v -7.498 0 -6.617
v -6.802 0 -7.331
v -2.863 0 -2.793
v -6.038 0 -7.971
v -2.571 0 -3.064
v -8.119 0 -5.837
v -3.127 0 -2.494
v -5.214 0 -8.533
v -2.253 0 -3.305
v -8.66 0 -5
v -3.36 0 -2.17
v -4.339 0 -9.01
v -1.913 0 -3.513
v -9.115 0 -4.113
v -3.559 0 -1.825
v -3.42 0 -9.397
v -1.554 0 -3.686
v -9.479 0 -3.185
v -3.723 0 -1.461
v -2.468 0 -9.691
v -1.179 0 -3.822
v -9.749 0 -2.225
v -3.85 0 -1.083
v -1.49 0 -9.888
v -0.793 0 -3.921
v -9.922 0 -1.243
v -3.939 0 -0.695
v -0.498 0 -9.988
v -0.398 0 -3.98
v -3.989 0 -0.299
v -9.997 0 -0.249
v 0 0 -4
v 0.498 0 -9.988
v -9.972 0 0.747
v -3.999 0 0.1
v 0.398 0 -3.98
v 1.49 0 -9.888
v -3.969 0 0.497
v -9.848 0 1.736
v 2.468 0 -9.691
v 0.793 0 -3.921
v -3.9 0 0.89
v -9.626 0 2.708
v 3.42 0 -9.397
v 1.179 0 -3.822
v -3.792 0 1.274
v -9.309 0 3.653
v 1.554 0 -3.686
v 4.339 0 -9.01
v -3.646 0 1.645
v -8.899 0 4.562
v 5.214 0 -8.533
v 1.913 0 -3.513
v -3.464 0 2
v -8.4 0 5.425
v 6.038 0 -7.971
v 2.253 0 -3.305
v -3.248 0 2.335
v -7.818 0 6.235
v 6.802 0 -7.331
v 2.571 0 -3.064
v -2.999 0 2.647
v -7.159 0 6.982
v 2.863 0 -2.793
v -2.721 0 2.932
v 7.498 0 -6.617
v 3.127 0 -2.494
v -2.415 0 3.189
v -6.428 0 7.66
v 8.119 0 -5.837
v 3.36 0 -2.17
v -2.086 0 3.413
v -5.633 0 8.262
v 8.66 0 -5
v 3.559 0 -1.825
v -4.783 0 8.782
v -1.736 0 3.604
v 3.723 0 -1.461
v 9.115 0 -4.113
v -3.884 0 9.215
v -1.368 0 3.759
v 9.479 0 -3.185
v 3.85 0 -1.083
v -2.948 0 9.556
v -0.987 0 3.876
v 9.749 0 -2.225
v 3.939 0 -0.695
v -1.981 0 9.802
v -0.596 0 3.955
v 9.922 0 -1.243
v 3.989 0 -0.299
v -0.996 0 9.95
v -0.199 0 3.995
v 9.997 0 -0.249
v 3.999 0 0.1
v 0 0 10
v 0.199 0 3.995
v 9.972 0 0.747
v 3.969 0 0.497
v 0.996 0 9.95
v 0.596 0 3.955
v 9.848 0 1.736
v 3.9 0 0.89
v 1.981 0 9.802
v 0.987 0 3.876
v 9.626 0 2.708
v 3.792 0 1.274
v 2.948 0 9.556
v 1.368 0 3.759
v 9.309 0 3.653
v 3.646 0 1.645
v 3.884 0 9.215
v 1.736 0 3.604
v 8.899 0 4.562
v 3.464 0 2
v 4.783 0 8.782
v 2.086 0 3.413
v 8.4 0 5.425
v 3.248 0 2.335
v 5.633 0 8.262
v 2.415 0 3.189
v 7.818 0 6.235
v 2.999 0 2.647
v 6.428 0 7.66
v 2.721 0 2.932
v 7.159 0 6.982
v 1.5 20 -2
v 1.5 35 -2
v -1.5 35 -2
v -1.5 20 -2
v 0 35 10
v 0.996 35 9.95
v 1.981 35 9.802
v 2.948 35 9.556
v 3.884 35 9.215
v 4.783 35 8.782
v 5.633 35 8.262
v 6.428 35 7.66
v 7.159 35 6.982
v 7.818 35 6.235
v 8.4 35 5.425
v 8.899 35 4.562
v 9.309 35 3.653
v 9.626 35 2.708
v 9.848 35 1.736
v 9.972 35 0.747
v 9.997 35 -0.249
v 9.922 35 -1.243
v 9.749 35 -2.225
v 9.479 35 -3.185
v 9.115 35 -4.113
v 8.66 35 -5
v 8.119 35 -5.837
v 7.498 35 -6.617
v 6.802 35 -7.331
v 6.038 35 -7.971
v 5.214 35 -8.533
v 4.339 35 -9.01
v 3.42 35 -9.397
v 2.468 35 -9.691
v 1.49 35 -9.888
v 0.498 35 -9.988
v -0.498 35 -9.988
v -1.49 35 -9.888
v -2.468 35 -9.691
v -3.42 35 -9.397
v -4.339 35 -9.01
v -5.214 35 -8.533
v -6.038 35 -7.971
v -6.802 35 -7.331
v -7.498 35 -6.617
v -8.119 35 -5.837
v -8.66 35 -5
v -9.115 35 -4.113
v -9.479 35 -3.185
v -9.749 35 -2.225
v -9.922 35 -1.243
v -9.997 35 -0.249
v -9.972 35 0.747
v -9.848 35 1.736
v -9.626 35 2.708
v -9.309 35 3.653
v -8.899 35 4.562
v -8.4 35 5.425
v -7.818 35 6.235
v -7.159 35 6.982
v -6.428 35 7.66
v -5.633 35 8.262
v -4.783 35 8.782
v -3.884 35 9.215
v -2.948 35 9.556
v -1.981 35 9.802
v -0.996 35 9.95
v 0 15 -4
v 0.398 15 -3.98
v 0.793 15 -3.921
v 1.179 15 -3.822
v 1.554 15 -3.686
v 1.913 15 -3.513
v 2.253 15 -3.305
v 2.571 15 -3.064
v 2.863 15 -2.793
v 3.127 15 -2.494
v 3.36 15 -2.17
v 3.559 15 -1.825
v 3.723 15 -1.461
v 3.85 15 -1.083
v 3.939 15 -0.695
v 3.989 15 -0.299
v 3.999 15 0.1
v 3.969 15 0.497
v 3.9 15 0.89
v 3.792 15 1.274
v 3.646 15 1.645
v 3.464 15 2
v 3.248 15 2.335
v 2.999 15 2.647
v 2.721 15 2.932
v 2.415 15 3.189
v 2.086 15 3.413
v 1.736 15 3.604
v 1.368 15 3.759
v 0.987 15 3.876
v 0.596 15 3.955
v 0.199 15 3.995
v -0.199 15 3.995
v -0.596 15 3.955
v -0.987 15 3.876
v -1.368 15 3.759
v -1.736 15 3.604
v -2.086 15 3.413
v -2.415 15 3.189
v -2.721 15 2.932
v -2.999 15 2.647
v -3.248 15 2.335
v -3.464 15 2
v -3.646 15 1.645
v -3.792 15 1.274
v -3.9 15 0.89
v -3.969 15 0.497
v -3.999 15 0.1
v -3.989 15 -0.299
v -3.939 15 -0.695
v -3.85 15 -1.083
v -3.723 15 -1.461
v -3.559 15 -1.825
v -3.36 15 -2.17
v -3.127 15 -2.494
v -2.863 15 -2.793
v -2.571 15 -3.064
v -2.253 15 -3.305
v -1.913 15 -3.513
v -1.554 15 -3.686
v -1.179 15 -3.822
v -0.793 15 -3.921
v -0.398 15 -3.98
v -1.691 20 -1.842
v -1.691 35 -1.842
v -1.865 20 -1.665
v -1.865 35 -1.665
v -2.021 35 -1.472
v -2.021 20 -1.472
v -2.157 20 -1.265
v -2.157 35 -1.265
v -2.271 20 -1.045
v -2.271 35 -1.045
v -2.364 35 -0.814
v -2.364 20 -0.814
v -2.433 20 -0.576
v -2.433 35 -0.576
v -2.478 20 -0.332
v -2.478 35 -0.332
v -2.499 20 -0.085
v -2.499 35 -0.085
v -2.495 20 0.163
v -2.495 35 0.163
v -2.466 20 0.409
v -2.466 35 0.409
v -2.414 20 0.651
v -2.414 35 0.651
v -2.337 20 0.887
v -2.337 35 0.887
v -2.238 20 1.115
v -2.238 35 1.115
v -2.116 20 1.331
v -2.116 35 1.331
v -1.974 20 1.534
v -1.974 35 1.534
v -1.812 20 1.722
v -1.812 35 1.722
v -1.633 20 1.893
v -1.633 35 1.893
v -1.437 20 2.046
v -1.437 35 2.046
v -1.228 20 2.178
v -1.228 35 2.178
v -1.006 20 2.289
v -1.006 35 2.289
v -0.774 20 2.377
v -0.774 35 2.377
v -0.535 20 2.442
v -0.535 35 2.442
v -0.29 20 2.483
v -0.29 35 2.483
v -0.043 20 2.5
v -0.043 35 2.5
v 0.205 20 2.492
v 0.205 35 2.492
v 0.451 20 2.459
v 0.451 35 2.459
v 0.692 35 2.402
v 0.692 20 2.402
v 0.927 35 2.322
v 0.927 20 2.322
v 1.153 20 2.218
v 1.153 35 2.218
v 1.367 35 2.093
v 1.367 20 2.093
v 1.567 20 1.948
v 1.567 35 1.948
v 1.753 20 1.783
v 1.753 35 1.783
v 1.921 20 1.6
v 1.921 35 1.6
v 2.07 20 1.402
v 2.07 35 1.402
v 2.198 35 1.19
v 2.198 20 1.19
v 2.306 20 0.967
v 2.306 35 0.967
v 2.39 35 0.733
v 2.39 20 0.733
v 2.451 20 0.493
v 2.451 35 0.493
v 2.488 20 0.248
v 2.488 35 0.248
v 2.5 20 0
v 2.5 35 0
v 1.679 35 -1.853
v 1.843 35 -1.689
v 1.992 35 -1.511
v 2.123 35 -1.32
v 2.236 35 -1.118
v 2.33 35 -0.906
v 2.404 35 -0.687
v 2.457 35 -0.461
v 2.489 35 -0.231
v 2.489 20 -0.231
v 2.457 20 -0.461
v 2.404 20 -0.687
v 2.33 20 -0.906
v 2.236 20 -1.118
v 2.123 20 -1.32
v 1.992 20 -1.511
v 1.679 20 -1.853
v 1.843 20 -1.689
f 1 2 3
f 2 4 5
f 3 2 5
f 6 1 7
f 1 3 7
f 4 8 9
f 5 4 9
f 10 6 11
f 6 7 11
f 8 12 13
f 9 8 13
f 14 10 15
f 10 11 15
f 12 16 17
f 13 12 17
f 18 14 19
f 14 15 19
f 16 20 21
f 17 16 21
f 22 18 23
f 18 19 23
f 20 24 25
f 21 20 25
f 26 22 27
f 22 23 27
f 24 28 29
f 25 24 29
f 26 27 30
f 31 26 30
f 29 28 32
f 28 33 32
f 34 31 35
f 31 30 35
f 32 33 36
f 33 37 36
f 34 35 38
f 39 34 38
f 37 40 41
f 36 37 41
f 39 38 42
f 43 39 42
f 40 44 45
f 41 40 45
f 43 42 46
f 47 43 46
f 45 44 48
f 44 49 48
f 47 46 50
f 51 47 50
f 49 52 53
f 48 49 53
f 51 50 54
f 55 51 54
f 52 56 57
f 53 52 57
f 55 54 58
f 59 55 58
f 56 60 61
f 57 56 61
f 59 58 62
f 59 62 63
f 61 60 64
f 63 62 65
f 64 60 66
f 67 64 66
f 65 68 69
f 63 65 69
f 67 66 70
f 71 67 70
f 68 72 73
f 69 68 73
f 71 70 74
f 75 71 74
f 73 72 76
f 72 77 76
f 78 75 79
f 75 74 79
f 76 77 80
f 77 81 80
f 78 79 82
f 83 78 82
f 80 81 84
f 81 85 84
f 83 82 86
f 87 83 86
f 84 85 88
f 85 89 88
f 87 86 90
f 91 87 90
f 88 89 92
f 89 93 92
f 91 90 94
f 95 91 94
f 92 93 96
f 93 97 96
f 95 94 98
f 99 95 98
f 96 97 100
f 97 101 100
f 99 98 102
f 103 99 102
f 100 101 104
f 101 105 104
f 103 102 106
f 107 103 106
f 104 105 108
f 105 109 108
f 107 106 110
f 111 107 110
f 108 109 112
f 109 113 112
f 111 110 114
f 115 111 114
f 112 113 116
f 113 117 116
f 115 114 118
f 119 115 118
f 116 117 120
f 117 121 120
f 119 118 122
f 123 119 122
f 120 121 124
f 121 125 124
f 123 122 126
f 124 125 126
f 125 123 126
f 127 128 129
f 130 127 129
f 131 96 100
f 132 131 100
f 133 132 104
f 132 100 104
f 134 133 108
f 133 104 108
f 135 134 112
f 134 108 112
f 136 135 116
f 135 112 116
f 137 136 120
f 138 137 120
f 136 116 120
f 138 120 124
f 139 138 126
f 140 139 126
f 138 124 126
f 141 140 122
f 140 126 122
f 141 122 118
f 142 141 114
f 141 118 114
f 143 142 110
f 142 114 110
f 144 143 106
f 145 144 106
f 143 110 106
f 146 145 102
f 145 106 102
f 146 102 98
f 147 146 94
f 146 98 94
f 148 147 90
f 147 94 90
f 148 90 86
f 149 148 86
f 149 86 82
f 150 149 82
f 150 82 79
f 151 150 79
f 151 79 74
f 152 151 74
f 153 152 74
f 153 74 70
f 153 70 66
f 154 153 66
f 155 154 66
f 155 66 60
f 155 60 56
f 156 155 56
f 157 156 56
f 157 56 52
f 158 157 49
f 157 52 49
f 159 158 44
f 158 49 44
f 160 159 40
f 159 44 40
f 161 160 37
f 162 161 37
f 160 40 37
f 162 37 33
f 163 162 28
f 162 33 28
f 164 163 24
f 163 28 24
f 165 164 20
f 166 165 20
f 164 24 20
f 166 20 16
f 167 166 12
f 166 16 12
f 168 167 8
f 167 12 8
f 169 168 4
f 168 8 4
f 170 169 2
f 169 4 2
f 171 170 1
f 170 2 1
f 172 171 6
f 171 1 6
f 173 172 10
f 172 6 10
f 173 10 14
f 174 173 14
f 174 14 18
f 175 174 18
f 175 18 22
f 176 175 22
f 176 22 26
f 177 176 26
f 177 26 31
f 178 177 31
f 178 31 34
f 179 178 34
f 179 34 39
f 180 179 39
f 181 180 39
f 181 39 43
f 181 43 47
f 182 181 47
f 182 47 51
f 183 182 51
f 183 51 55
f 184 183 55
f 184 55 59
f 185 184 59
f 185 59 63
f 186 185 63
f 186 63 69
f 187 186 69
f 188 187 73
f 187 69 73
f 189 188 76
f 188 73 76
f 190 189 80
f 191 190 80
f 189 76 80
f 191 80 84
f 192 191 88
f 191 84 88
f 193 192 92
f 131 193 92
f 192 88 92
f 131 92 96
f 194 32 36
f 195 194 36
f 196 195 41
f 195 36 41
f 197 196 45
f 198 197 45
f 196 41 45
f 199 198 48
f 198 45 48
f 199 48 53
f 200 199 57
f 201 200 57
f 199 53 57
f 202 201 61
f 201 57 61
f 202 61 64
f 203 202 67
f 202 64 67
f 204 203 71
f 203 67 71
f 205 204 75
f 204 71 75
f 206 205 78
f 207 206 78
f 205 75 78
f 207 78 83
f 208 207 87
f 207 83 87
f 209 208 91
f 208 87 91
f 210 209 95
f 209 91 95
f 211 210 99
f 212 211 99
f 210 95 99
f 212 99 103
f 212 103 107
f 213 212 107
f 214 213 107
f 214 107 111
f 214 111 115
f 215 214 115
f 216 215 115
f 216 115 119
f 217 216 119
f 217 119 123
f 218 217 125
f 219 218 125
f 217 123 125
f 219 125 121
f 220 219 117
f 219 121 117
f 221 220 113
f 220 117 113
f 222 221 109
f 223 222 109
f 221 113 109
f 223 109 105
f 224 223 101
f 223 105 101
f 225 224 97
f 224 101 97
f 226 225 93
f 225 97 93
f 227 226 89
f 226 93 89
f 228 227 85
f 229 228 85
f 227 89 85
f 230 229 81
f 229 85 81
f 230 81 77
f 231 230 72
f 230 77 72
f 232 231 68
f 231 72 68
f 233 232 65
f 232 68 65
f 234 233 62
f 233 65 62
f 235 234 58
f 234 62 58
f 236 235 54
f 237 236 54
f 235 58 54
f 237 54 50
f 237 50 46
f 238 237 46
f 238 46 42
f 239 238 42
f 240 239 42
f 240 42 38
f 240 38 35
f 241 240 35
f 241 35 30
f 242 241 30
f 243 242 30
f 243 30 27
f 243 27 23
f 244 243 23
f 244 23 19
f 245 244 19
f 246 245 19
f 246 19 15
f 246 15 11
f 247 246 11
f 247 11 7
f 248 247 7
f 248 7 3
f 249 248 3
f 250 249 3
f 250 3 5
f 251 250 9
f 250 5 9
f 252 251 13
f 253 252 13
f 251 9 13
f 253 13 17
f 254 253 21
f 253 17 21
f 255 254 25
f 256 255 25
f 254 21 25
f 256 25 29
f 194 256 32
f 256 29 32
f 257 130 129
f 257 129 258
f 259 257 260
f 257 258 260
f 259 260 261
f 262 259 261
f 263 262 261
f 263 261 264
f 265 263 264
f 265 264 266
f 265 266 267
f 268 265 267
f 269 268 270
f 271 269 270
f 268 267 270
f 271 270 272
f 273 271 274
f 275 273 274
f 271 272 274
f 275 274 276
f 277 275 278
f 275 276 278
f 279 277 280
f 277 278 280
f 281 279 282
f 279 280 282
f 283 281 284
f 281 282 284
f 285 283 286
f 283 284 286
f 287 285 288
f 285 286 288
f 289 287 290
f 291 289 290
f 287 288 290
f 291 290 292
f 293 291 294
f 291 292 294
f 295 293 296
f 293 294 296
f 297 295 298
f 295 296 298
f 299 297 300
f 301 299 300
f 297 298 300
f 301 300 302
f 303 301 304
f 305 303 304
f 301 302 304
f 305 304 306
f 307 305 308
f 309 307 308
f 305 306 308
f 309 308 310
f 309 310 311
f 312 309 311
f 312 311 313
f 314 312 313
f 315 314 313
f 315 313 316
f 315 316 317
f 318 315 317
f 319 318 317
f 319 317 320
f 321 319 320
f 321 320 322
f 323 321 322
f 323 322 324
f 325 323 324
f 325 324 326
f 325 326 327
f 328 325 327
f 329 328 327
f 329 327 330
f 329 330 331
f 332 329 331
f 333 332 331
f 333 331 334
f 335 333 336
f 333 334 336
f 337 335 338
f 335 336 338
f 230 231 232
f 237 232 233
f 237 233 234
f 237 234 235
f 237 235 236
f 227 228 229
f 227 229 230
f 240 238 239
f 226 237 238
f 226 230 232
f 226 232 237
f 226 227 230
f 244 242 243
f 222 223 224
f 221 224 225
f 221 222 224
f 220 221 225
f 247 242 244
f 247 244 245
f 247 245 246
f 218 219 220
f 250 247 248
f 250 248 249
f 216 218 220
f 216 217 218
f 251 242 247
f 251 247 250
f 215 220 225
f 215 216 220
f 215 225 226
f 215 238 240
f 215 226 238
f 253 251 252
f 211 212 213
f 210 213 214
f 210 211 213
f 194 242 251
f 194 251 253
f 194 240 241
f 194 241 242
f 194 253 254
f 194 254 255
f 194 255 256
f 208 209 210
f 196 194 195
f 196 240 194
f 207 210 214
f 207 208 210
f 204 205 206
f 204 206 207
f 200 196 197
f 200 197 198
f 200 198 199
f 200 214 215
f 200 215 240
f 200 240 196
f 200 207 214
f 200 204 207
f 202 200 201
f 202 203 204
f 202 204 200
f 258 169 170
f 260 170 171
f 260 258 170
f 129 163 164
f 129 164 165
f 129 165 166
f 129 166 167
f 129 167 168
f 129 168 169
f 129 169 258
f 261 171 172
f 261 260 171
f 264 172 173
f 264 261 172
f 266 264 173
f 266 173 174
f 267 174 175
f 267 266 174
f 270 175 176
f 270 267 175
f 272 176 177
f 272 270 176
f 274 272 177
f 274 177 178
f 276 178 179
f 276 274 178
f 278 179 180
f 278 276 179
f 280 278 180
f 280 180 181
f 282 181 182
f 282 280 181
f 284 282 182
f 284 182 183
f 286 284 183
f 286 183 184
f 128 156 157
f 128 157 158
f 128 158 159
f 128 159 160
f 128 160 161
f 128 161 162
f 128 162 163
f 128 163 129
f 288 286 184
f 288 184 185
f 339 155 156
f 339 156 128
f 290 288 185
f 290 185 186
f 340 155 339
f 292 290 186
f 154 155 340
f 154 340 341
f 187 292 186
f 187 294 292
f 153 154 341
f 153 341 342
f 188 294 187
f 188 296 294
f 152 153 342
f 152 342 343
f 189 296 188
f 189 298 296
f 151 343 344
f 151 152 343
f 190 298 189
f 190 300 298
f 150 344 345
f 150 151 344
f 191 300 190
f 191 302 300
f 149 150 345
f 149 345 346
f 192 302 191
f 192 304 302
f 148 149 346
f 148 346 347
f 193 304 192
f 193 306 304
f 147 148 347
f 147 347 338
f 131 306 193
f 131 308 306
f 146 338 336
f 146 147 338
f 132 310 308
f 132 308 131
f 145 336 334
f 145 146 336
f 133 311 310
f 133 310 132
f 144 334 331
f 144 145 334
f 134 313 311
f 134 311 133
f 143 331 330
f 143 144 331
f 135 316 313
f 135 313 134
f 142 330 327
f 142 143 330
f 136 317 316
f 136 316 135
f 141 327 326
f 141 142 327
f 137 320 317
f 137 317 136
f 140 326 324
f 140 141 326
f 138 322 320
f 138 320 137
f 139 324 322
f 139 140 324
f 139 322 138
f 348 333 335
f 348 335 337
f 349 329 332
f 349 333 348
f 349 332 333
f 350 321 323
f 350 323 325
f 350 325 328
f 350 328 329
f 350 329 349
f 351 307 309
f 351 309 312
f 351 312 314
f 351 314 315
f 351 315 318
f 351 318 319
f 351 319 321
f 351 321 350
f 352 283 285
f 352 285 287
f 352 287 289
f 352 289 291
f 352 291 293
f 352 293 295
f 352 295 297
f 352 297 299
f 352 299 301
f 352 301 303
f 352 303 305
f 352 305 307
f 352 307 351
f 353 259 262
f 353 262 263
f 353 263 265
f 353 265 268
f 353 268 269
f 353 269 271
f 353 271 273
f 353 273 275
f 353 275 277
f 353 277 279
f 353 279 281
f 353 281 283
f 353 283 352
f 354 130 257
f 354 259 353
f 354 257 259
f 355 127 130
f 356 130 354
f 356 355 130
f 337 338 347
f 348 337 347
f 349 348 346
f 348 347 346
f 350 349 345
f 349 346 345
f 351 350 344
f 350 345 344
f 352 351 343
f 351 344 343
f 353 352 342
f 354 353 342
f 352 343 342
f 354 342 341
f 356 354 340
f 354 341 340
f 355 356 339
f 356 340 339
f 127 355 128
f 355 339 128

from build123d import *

# Parameters (mm, degrees)
SKETCH1_R           = 10
BOSS_EXTRUDE1_DEPTH = 35
SKETCH3_R           = 4
CUT_EXTRUDE2_DEPTH  = 15
CUT_EXTRUDE1_DEPTH  = 15


with BuildPart() as part:
    # Sketch1 → Boss-Extrude1 (new body)
    with BuildSketch(Plane(origin=(0, 0, 0), x_dir=(1, 0, 0), z_dir=(0, 1, 0))):
        with Locations(Location((0, 0, 0), (0, 0, 270))):
            Circle(SKETCH1_R)
    extrude(amount=BOSS_EXTRUDE1_DEPTH)

    # Sketch3 → Cut-Extrude2 (cut)
    with BuildSketch(Plane.XZ):
        with Locations(Location((0, 0, 0), (0, 0, 270))):
            Circle(SKETCH3_R)
    extrude(amount=-CUT_EXTRUDE2_DEPTH, mode=Mode.SUBTRACT)

    # Sketch2 → Cut-Extrude1 (cut)
    with BuildSketch(Plane(origin=(0, 35, 0), x_dir=(1, 0, 0), z_dir=(0, 1, 0))):
        with BuildLine():
            Line((1.5, 2), (-1.5, 2))
            ThreePointArc((-1.5, 2), (-1.118033989, -2.236067977), (2.5, 0))
            ThreePointArc((2.5, 0), (2.236067977, 1.118033989), (1.5, 2))
        make_face()
    extrude(amount=-CUT_EXTRUDE1_DEPTH, mode=Mode.SUBTRACT)


solid = part.part
